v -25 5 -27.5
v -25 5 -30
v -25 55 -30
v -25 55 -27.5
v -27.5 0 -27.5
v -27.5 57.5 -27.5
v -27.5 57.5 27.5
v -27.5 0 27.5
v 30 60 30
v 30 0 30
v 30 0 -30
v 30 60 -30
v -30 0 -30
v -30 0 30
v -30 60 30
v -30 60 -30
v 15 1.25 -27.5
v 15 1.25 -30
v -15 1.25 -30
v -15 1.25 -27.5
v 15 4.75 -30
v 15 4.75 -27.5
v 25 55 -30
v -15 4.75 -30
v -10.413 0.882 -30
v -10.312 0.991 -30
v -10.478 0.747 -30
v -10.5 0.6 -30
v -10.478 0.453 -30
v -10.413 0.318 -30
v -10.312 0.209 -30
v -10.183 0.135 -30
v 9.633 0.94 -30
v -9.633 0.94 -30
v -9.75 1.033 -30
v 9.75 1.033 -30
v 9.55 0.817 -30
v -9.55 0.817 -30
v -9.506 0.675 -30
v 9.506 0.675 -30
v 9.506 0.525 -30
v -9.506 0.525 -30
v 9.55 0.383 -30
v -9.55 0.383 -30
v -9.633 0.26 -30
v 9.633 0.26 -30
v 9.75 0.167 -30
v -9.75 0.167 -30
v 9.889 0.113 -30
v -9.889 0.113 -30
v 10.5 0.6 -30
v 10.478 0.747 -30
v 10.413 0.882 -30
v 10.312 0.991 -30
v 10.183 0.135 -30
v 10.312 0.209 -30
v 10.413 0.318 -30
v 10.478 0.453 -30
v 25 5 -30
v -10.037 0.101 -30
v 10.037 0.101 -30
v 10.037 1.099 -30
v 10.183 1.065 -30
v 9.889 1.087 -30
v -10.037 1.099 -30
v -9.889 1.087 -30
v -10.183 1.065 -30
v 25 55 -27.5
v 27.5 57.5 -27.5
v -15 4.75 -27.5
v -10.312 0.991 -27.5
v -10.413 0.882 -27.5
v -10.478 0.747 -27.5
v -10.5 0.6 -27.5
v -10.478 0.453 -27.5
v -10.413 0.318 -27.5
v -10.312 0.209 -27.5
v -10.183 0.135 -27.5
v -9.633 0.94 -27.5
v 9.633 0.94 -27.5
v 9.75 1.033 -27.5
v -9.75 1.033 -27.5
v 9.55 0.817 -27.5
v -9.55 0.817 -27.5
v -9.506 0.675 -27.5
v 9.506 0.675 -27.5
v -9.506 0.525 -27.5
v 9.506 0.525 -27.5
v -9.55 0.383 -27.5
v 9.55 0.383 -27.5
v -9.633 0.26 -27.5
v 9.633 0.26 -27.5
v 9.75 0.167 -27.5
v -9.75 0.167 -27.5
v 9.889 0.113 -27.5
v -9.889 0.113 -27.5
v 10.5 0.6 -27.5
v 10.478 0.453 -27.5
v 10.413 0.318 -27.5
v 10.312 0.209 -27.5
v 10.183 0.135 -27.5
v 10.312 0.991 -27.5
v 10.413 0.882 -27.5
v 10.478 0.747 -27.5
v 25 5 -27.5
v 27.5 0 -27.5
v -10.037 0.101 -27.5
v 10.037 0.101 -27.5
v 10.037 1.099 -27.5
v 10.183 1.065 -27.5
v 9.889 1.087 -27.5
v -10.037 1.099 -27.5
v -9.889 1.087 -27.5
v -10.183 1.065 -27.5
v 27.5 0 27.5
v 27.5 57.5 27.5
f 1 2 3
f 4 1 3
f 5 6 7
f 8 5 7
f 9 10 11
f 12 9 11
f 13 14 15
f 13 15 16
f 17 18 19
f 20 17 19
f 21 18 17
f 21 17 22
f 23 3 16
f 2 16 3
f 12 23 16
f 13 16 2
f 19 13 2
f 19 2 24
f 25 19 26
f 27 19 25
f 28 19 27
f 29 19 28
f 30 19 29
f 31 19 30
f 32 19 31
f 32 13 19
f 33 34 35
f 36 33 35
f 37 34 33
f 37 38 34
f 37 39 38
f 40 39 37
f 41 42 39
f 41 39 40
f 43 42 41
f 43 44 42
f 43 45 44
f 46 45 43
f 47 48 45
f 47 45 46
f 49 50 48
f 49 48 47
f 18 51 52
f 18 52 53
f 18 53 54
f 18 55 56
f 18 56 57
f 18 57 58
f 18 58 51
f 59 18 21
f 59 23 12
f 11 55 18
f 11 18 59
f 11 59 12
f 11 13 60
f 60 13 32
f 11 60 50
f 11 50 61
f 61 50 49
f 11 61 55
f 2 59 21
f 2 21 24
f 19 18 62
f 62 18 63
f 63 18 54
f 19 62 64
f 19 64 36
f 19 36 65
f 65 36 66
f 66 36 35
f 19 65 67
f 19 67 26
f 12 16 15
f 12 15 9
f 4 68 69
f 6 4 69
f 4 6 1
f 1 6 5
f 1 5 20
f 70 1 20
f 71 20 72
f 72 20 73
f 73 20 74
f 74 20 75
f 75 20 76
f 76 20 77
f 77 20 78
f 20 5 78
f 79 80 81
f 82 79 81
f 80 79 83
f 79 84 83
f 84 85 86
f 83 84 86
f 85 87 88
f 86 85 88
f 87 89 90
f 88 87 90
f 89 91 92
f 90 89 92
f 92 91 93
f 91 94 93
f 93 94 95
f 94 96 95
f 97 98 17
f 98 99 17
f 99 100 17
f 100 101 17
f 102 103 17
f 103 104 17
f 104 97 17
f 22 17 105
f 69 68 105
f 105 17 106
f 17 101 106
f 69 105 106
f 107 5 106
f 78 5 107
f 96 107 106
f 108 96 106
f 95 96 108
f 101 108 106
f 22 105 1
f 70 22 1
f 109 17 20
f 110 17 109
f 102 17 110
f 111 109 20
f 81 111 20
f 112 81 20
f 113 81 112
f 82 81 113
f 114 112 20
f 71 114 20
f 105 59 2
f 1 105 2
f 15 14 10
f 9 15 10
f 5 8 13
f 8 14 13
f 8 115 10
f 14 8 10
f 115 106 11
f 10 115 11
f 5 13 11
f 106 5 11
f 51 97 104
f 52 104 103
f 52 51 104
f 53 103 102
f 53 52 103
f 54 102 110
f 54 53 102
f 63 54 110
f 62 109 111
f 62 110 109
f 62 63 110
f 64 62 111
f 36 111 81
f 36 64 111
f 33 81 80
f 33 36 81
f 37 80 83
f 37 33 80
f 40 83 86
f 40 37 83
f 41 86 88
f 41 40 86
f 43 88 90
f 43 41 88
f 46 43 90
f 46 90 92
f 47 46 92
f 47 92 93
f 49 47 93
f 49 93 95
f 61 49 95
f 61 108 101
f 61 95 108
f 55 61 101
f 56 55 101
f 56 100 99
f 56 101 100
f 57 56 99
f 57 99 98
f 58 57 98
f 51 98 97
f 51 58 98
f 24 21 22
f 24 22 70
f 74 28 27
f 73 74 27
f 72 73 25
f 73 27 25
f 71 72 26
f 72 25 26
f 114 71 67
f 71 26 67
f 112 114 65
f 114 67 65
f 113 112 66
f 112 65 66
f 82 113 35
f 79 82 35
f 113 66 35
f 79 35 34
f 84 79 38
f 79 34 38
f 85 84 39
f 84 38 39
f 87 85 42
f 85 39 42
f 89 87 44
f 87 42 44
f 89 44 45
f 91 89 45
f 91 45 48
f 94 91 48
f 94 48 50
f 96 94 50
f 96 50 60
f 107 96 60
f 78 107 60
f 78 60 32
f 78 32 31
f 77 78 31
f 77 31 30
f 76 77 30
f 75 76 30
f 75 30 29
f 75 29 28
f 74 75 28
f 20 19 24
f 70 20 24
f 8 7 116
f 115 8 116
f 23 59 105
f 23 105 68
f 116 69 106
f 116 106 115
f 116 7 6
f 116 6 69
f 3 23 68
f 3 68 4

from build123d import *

# Parameters (mm, degrees)
SKETCH1_W           = 60
SKETCH1_H           = 60
BOSS_EXTRUDE1_DEPTH = 60
SKETCH2_W           = 55
SKETCH2_H           = 55
BOSS_EXTRUDE2_DEPTH = 57.5
SKETCH2_2_W         = 55
SKETCH2_2_H         = 55
CUT_EXTRUDE1_DEPTH  = 57.5
SKETCH5_W           = 50
SKETCH5_H           = 50
CUT_EXTRUDE2_DEPTH  = 20
SKETCH6_W           = 30
SKETCH6_H           = 3.5
CUT_EXTRUDE3_DEPTH  = 20
SKETCH7_R           = 0.5
CUT_EXTRUDE4_DEPTH  = 3.3


with BuildPart() as part:
    # Sketch1 → Boss-Extrude1 (new body)
    with BuildSketch(Plane(origin=(0, 0, 0), x_dir=(1, 0, 0), z_dir=(0, 1, 0))):
        Rectangle(SKETCH1_W, SKETCH1_H)
    extrude(amount=BOSS_EXTRUDE1_DEPTH)

    # Sketch2 → Boss-Extrude2 (add)
    with BuildSketch(Plane.XZ):
        Rectangle(SKETCH2_W, SKETCH2_H)
    extrude(amount=-BOSS_EXTRUDE2_DEPTH)

    # Sketch2<2> → Cut-Extrude1 (cut)
    with BuildSketch(Plane.XZ):
        Rectangle(SKETCH2_2_W, SKETCH2_2_H)
    extrude(amount=-CUT_EXTRUDE1_DEPTH, mode=Mode.SUBTRACT)

    # Sketch5 → Cut-Extrude2 (cut)
    with BuildSketch(Plane(origin=(0, 0, -30), x_dir=(-1, 0, 0), z_dir=(0, 0, -1))):
        with Locations((0, 30)):
            Rectangle(SKETCH5_W, SKETCH5_H)
    extrude(amount=-CUT_EXTRUDE2_DEPTH, mode=Mode.SUBTRACT)

    # Sketch6 → Cut-Extrude3 (cut)
    with BuildSketch(Plane(origin=(0, 0, -30), x_dir=(-1, 0, 0), z_dir=(0, 0, -1))):
        with Locations((0, 3)):
            Rectangle(SKETCH6_W, SKETCH6_H)
    extrude(amount=-CUT_EXTRUDE3_DEPTH, mode=Mode.SUBTRACT)

    # Sketch7 → Cut-Extrude4 (cut)
    with BuildSketch(Plane(origin=(0, 0, -30), x_dir=(-1, 0, 0), z_dir=(0, 0, -1))):
        with Locations((10, 0.6)):
            Circle(SKETCH7_R)
    cut_extrude4 = extrude(amount=-CUT_EXTRUDE4_DEPTH, mode=Mode.SUBTRACT)

    # Mirror1: Cut-Extrude4 across plane
    add(cut_extrude4.mirror(Plane.ZY), mode=Mode.SUBTRACT)


solid = part.part
